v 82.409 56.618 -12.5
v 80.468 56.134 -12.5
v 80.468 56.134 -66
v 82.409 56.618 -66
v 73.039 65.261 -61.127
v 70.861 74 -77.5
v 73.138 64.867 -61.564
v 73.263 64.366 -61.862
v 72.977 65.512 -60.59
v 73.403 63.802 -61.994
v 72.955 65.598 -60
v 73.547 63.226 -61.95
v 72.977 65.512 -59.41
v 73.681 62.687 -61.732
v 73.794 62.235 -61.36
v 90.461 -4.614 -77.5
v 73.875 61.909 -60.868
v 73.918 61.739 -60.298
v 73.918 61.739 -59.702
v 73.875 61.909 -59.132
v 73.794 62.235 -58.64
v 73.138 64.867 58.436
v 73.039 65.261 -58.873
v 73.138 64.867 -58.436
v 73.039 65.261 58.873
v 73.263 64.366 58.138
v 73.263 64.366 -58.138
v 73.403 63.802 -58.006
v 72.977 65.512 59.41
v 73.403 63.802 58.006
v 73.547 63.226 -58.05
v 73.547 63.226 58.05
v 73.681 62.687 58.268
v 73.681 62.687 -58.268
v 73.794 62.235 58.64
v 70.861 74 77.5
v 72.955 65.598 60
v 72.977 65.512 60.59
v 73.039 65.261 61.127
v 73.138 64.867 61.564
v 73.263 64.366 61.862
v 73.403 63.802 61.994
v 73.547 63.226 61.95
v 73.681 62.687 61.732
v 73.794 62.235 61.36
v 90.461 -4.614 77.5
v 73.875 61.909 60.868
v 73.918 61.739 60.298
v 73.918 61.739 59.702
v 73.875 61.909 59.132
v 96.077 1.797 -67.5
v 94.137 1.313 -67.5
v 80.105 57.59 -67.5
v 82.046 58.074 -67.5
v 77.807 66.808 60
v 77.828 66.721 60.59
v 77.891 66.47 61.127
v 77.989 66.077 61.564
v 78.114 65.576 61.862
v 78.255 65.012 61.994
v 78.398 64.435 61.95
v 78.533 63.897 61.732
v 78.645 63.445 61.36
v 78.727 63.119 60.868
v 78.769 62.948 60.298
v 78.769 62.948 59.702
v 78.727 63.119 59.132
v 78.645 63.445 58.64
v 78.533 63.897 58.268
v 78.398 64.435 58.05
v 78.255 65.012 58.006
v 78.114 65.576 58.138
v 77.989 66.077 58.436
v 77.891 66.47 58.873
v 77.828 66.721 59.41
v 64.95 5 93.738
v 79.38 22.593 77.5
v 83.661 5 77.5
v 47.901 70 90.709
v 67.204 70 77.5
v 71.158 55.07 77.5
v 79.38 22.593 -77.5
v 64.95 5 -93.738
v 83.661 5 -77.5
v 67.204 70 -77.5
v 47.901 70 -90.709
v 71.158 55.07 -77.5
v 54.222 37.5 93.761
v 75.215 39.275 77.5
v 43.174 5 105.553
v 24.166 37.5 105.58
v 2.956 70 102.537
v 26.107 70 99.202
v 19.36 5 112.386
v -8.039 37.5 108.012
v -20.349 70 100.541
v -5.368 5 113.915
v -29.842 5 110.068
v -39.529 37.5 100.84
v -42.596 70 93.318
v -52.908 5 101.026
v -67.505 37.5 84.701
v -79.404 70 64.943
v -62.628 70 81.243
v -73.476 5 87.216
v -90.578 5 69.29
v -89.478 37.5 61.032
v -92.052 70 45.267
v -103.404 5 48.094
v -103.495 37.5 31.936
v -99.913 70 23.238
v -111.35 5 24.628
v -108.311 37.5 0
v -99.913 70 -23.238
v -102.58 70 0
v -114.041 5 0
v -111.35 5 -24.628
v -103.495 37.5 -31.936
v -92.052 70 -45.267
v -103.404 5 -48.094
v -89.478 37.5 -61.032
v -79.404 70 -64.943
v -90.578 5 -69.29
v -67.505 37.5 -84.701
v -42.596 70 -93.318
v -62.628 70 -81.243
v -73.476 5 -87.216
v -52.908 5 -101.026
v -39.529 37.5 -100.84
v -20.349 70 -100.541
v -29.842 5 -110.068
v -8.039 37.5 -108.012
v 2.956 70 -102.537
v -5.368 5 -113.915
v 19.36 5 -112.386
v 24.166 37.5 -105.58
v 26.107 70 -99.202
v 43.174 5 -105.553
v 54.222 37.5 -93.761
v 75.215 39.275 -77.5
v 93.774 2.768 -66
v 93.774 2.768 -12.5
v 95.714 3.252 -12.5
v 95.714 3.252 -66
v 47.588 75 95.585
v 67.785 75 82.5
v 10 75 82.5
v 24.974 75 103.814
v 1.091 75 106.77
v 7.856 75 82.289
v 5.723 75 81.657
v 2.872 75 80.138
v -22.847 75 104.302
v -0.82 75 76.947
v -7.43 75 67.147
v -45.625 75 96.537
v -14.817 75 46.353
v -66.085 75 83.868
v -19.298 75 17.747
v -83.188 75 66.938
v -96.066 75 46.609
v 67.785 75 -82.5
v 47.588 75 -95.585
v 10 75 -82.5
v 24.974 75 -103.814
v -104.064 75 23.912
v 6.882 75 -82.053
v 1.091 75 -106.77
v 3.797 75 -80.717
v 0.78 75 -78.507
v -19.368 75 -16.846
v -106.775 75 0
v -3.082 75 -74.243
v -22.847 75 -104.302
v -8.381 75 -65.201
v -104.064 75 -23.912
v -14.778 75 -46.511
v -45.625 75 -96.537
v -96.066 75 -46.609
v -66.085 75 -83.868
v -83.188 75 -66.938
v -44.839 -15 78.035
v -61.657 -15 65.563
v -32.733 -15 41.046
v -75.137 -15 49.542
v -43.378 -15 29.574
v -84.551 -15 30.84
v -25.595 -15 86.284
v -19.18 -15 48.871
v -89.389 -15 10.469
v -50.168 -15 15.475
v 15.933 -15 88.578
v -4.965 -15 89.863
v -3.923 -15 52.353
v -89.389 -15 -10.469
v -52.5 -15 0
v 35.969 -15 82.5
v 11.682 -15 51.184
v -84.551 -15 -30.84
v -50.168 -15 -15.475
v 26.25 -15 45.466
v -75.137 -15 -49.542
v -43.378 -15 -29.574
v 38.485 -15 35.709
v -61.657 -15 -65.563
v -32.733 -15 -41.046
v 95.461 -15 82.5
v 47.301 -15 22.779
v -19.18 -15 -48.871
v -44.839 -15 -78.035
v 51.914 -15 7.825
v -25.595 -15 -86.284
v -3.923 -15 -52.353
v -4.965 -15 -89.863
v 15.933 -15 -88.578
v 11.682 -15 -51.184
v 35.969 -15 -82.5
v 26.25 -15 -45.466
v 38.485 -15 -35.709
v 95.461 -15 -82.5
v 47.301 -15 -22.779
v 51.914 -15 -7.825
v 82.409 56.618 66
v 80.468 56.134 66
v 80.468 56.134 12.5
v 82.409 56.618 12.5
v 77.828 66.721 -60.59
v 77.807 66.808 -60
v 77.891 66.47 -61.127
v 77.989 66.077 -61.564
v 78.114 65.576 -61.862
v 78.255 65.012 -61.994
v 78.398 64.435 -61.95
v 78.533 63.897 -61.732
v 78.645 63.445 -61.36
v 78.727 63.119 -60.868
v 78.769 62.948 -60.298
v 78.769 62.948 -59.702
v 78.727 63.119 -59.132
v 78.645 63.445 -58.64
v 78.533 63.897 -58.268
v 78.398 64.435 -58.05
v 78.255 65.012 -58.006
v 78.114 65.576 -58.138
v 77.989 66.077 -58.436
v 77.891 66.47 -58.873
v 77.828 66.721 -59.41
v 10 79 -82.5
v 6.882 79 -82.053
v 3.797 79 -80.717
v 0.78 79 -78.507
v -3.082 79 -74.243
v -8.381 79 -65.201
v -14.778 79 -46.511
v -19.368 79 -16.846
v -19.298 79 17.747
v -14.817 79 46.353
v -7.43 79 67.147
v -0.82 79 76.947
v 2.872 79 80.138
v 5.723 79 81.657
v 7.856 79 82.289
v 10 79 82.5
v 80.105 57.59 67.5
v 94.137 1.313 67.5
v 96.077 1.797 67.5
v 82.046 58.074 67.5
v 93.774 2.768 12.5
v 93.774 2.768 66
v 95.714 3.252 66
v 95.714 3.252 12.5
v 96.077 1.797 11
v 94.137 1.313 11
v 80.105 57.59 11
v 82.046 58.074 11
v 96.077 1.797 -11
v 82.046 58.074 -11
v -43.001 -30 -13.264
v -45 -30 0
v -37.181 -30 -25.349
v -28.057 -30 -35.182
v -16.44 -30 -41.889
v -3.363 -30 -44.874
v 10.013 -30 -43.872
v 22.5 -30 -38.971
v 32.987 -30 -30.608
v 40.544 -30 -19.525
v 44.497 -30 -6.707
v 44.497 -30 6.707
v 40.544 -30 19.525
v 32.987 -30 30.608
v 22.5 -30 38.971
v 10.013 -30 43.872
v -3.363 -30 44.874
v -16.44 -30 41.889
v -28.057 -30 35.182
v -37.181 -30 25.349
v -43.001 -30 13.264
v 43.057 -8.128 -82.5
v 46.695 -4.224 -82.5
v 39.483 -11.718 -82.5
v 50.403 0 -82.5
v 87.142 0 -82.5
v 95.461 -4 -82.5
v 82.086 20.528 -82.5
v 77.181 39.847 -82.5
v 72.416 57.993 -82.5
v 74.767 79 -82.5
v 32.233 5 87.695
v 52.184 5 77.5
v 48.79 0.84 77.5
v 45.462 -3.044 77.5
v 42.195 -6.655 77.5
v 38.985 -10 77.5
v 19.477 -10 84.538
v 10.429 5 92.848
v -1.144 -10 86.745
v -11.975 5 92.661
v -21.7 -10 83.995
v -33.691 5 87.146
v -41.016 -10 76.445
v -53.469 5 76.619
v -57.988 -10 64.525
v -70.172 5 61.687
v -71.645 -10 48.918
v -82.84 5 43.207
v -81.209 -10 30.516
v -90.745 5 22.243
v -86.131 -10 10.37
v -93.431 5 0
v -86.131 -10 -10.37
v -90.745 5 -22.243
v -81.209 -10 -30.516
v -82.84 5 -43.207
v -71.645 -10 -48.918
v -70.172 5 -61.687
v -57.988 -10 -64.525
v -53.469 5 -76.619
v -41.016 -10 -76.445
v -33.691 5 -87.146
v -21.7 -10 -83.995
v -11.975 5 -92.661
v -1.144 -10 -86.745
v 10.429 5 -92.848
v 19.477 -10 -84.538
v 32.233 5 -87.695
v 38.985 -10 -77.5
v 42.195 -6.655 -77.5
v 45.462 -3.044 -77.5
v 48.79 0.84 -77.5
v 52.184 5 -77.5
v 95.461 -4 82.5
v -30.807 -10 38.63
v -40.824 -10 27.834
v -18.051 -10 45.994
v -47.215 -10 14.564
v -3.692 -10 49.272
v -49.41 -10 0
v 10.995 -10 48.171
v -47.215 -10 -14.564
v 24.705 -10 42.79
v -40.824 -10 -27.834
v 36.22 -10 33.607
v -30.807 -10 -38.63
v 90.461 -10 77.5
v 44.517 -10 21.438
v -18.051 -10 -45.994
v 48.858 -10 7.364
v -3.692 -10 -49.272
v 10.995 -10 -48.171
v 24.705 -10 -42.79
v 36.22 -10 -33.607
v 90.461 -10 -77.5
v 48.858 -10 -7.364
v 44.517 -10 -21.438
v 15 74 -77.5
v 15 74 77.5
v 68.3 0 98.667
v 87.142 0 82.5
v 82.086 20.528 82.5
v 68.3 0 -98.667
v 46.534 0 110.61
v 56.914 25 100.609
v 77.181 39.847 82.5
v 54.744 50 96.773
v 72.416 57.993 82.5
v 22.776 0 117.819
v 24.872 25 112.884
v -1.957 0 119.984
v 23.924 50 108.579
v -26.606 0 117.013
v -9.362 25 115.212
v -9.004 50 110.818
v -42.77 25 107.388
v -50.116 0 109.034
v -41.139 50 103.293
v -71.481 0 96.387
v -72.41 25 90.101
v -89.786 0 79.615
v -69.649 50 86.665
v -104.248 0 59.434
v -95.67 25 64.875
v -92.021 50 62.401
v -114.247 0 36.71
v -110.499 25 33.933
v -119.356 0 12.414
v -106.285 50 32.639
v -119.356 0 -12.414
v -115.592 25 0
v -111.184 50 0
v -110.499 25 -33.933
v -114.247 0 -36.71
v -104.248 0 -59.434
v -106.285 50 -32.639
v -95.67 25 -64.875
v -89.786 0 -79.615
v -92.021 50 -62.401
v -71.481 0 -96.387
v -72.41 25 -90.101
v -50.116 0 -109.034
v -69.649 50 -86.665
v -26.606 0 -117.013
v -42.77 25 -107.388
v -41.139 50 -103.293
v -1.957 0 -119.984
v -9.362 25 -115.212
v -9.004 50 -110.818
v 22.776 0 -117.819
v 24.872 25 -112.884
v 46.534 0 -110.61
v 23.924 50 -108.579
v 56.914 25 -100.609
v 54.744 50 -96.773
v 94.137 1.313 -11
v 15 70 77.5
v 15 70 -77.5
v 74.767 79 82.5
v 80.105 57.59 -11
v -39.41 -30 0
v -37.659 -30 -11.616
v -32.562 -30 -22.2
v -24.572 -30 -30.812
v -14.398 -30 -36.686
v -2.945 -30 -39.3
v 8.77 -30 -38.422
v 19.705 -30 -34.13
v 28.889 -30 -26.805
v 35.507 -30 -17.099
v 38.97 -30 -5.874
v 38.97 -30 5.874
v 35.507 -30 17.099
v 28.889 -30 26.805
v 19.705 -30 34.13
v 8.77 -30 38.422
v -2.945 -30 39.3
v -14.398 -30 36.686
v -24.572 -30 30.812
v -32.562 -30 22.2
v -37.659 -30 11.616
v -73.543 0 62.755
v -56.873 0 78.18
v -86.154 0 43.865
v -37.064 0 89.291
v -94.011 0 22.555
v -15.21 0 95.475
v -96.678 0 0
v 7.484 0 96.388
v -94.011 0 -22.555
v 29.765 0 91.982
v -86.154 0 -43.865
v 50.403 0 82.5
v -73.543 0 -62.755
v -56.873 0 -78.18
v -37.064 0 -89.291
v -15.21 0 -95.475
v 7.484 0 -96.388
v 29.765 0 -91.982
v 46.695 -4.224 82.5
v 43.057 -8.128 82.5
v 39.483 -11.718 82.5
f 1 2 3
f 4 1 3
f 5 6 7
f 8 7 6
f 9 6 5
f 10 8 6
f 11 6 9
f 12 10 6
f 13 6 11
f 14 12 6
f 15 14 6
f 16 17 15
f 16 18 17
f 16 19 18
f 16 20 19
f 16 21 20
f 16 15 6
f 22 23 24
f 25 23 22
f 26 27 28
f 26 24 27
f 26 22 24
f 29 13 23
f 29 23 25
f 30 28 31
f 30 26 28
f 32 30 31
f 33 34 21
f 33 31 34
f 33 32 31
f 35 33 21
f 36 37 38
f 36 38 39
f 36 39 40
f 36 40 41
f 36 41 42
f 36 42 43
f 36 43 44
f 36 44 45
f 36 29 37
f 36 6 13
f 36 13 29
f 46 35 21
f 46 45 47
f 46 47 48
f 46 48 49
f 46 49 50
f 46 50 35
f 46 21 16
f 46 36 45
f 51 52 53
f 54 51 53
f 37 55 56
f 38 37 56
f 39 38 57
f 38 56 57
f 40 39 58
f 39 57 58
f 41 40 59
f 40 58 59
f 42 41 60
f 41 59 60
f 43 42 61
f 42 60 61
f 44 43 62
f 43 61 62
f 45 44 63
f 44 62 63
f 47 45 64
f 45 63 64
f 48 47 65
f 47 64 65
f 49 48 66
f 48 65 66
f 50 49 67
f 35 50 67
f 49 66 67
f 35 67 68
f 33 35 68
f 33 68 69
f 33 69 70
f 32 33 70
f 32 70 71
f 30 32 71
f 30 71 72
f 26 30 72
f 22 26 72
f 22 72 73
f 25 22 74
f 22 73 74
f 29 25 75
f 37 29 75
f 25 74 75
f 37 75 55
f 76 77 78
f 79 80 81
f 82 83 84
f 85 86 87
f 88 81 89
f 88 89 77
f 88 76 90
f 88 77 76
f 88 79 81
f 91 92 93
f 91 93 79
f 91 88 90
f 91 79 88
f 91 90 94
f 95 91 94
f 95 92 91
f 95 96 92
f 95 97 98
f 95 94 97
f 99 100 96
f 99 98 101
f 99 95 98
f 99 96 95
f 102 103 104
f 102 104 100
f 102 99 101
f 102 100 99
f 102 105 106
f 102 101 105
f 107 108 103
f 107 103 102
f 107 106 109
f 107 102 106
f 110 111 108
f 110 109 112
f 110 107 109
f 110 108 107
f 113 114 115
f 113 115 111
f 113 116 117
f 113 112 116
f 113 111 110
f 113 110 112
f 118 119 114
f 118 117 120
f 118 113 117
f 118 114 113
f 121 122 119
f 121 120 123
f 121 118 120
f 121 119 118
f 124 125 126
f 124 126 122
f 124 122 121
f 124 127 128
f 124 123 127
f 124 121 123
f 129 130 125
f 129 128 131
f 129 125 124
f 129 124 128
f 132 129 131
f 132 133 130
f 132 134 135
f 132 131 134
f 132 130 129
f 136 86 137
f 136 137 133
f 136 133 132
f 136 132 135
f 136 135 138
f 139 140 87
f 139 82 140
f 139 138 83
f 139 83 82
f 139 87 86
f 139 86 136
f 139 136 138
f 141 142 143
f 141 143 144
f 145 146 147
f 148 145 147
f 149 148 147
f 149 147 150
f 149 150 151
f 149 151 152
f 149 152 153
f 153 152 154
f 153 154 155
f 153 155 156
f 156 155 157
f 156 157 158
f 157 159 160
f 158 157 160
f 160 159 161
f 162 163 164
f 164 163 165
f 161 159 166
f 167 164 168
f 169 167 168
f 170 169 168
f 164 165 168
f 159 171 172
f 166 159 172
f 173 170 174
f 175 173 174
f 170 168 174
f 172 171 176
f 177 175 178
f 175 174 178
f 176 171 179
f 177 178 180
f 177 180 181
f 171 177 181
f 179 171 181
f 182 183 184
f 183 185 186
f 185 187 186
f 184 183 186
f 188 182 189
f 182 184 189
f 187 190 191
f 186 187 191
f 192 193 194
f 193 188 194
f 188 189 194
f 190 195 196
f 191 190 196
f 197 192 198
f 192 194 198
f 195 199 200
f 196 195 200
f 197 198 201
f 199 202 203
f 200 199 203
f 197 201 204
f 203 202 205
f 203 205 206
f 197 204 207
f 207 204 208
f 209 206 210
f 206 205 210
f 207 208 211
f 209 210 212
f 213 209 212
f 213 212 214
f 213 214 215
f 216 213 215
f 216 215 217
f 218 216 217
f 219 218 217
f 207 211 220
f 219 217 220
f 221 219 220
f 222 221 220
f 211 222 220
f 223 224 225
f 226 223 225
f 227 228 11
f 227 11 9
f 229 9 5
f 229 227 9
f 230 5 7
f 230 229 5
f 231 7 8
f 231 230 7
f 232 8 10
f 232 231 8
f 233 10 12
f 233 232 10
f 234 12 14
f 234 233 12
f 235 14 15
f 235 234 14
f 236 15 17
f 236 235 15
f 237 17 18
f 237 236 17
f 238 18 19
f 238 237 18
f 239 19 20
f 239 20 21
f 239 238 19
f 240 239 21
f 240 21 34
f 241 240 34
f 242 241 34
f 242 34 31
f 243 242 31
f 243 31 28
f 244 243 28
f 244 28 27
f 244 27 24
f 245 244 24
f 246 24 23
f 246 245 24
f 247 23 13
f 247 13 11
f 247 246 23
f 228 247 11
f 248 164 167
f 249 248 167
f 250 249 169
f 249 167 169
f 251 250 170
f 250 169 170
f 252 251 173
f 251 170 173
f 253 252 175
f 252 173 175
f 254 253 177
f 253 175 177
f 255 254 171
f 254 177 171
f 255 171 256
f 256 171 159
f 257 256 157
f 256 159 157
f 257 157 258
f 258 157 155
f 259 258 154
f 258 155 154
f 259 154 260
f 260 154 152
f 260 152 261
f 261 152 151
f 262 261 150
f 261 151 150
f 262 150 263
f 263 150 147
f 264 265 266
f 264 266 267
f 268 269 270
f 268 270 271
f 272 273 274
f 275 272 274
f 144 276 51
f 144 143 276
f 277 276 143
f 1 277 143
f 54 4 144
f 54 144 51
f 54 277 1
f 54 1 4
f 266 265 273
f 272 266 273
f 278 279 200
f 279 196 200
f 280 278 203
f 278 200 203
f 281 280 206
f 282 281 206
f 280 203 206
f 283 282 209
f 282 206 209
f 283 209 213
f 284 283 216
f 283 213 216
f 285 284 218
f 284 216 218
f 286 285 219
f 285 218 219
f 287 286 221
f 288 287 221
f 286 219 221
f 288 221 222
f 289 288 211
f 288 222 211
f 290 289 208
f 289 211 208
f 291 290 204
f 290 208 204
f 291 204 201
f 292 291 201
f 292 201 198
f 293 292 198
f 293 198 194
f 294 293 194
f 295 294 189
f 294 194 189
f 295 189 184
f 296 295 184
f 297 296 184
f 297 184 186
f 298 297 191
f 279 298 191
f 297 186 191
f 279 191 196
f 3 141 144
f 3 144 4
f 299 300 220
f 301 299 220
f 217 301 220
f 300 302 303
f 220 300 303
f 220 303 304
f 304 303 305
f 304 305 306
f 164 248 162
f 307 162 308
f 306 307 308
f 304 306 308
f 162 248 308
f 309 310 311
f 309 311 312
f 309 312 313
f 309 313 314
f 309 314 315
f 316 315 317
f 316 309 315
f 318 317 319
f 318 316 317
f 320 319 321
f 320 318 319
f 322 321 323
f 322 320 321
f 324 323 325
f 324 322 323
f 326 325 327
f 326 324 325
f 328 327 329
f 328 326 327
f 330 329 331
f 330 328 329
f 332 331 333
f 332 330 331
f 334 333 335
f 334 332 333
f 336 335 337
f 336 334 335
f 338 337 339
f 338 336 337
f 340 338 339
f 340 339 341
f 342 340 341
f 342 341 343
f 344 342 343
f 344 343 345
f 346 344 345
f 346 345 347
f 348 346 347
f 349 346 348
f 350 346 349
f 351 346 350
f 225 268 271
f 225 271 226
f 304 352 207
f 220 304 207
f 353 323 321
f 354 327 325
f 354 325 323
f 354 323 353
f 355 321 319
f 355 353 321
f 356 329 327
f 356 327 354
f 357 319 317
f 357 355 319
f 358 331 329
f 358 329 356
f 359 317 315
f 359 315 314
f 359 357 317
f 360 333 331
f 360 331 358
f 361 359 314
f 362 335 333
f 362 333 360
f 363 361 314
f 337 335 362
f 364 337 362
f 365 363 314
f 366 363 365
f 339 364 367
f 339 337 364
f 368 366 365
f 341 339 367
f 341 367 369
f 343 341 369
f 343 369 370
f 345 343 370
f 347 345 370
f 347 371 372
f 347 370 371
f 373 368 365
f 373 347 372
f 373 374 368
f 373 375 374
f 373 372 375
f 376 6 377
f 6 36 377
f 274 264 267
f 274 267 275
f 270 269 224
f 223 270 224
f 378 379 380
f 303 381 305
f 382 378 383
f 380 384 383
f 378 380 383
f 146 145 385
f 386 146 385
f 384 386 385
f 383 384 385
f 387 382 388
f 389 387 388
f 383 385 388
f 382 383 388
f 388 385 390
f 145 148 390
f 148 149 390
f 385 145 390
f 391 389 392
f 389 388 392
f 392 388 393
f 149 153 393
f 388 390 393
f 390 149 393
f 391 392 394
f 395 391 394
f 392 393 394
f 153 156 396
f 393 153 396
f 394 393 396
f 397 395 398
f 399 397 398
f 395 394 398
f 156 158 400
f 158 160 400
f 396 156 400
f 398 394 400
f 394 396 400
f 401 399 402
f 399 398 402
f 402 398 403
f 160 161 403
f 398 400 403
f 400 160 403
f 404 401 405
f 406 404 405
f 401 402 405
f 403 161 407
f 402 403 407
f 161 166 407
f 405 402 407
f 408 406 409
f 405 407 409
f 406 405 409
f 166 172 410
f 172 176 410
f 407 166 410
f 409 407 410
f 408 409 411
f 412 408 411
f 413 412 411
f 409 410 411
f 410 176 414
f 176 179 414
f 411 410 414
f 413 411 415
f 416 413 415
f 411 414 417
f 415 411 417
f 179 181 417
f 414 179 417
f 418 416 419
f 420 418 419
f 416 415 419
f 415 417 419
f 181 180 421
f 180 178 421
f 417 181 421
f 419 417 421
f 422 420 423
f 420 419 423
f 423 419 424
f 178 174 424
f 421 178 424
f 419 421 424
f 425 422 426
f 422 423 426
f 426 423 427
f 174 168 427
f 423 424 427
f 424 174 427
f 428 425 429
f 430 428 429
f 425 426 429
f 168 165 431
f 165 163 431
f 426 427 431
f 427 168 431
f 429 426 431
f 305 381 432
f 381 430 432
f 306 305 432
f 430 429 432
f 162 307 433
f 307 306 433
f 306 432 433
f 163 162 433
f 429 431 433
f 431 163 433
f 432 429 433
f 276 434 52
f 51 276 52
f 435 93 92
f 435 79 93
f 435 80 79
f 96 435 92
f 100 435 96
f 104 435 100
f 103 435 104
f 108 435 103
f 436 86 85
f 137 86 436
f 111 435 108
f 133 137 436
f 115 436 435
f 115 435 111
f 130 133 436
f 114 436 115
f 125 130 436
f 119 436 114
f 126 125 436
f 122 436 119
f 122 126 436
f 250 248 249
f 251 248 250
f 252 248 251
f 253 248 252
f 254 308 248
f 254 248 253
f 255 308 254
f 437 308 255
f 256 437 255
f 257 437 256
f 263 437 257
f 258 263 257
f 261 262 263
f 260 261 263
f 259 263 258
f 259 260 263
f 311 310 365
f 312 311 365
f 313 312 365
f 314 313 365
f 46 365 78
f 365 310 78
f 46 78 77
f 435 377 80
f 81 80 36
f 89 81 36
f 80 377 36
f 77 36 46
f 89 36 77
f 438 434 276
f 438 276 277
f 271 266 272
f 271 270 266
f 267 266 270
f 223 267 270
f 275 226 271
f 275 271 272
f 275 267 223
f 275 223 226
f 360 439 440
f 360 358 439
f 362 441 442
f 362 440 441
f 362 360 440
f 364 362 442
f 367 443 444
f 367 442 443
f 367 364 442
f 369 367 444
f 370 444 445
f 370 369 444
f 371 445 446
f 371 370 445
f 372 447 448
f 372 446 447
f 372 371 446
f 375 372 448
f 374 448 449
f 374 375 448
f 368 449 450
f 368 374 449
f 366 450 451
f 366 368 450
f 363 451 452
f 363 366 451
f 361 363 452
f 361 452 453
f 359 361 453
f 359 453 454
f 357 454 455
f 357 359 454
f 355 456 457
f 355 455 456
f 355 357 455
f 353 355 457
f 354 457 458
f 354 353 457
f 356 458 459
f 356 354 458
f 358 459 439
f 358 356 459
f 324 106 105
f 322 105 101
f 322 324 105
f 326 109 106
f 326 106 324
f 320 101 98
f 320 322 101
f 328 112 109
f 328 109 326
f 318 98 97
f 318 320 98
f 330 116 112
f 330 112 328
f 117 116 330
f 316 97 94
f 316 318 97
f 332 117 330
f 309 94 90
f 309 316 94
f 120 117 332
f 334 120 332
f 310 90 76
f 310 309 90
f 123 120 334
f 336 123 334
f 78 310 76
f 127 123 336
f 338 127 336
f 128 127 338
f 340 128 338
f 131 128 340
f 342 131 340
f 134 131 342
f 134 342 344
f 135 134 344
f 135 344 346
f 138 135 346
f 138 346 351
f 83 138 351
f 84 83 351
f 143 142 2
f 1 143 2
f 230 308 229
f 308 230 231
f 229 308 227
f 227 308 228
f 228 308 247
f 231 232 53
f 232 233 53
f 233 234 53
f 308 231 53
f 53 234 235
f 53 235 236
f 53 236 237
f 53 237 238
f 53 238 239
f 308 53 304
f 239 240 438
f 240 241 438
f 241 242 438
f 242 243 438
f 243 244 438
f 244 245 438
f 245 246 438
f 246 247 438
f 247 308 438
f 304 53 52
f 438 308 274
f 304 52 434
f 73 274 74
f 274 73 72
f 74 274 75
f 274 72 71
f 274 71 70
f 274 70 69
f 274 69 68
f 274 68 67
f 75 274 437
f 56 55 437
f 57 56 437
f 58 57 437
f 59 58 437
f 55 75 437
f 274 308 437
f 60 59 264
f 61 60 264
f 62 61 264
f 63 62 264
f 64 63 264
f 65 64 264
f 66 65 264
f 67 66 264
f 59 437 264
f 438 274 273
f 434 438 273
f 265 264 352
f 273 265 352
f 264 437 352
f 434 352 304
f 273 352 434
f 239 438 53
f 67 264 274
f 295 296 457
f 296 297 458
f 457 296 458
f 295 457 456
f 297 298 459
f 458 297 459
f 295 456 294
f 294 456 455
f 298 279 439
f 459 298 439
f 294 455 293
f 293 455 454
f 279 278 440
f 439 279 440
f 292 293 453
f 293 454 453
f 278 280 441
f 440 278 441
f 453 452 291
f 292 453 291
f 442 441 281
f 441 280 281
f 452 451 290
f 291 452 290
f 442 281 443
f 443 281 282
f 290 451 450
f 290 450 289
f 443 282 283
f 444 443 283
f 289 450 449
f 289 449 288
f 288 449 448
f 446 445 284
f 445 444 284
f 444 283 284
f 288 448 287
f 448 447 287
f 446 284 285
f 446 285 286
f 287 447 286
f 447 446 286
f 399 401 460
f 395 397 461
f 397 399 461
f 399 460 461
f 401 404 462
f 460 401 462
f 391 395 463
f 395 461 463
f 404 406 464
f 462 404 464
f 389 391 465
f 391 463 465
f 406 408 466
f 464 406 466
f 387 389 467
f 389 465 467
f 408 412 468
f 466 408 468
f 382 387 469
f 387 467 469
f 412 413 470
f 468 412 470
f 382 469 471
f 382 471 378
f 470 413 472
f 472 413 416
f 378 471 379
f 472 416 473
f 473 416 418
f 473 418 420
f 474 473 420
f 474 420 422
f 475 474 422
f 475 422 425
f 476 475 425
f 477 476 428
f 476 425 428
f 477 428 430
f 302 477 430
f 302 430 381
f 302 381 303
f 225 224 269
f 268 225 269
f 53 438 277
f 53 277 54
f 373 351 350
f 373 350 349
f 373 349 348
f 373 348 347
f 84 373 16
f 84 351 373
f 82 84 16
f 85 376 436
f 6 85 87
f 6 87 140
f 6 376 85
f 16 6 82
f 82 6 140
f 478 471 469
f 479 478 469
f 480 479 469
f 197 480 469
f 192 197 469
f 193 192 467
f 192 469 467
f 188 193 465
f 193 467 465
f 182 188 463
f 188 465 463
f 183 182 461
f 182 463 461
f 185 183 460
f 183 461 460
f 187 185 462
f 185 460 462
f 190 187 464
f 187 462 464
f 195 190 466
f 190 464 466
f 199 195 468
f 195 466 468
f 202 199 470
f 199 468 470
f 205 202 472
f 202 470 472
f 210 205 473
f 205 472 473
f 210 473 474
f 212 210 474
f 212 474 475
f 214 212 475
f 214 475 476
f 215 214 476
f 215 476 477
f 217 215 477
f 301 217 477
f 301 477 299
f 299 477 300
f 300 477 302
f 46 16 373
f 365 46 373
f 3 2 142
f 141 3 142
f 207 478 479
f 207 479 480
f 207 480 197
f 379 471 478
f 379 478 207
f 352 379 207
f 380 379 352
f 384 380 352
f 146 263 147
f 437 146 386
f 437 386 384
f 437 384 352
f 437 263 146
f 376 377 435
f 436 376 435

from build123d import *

# Parameters (mm, degrees)
BOSS_EXTRUDE6_DEPTH     = 165
CUT_EXTRUDE3_DEPTH      = 381.566986876
CUT_EXTRUDE3_DEPTH_BACK = 381.566986876
SHELL1_T                = -10
SKETCH8_W               = 113
SKETCH8_H               = 116
SKETCH8_W_2             = 107
SKETCH8_H_2             = 110
BOSS_EXTRUDE5_DEPTH     = 4
SKETCH4_RX              = 165
SKETCH4_RY              = 60
BOSS_EXTRUDE7_DEPTH     = 8
SKETCH9_R               = 4
CUT_EXTRUDE4_DEPTH      = 10
SCALE1_SCALE            = 0.5


with BuildPart() as part:
    # Sketch1 → Revolve1 (revolve)
    with BuildSketch(Plane.XY, mode=Mode.PRIVATE) as revolve1_sk:
        Polygon((240, 0), (213.550952894, 150), (0, 150), (0, 0), (0, -30), (180, -30), (193.356860559, 0), align=None)
    revolve(revolve1_sk.sketch.rotate(Axis((0, 150, 0), (0, -1, 0)), 180), axis=Axis((0, 150, 0), (0, -1, 0)))

    # Sketch2 → Boss-Extrude6 (add, symmetric)
    with BuildSketch(Plane.XY):
        Polygon((20, -30), (144.519146375, -30), (249.534028741, -30), (249.534028741, -8), (220.263749943, 158), (20, 158), align=None)
    extrude(amount=BOSS_EXTRUDE6_DEPTH, both=True)

    # Sketch5 → Revolve3 (revolve)
    with BuildSketch(Plane.XY, mode=Mode.PRIVATE) as revolve3_sk:
        Polygon((0, -30), (0, -60), (90, -60), (105, -30), align=None)
    revolve(revolve3_sk.sketch.rotate(Axis((0, -30, 0), (0, -1, 0)), 180), axis=Axis((0, -30, 0), (0, -1, 0)))

    # Sketch7 → Cut-Extrude3 (cut, two sides)
    with BuildSketch(Plane.XY) as cut_extrude3_sk:
        Polygon((149.534028741, 158), (190.922477213, -8), (190.922477213, -30), (249.534028741, -30), (249.534028741, 158), align=None)
    extrude(amount=CUT_EXTRUDE3_DEPTH, mode=Mode.SUBTRACT)
    extrude(cut_extrude3_sk.sketch, amount=-CUT_EXTRUDE3_DEPTH_BACK, mode=Mode.SUBTRACT)

    # Shell1
    shell1_openings = [part.faces().sort_by_distance(p)[0] for p in [
        (0, -60, 0),
    ]]
    offset(amount=SHELL1_T, openings=shell1_openings, kind=Kind.INTERSECTION)

    # Sketch8 → Boss-Extrude5 (add)
    with BuildSketch(Plane(origin=(177.870623194, 44.348127245, 0), x_dir=(0, 0, -1), z_dir=(0.9702957262759971, 0.24192189559966487, 0))):
        with Locations((-78.5, 15)):
            Rectangle(SKETCH8_W, SKETCH8_H)
        with Locations((-78.5, 15)):
            Rectangle(SKETCH8_W_2, SKETCH8_H_2, mode=Mode.SUBTRACT)
        with Locations((78.5, 15)):
            Rectangle(SKETCH8_W, SKETCH8_H)
        with Locations((78.5, 15)):
            Rectangle(SKETCH8_W_2, SKETCH8_H_2, mode=Mode.SUBTRACT)
    extrude(amount=BOSS_EXTRUDE5_DEPTH)

    # Sketch4 → Boss-Extrude7 (add)
    with BuildSketch(Plane(origin=(0, 150, 0), x_dir=(1, 0, 0), z_dir=(0, 1, 0))):
        with Locations(Location((20, 0), (0, 0, 90))):
            Ellipse(SKETCH4_RX, SKETCH4_RY)
    extrude(amount=BOSS_EXTRUDE7_DEPTH)

    # Sketch9 → Cut-Extrude4 (cut)
    with BuildSketch(Plane(origin=(177.870623194, 44.348127245, 0), x_dir=(0, 0, -1), z_dir=(0.9702957262759971, 0.24192189559966487, 0))):
        with Locations(Location((-120, 88, 0), (0, 0, 90))):
            Circle(SKETCH9_R)
    cut_extrude4 = extrude(amount=-CUT_EXTRUDE4_DEPTH, mode=Mode.SUBTRACT)

    # Mirror1: Cut-Extrude4 across plane
    add(cut_extrude4.mirror(Plane.XY), mode=Mode.SUBTRACT)


with BuildPart() as part_1:
    # Scale1: scaled about (0, 0, 0)
    add(part.part.scale(SCALE1_SCALE))


solid = part_1.part
